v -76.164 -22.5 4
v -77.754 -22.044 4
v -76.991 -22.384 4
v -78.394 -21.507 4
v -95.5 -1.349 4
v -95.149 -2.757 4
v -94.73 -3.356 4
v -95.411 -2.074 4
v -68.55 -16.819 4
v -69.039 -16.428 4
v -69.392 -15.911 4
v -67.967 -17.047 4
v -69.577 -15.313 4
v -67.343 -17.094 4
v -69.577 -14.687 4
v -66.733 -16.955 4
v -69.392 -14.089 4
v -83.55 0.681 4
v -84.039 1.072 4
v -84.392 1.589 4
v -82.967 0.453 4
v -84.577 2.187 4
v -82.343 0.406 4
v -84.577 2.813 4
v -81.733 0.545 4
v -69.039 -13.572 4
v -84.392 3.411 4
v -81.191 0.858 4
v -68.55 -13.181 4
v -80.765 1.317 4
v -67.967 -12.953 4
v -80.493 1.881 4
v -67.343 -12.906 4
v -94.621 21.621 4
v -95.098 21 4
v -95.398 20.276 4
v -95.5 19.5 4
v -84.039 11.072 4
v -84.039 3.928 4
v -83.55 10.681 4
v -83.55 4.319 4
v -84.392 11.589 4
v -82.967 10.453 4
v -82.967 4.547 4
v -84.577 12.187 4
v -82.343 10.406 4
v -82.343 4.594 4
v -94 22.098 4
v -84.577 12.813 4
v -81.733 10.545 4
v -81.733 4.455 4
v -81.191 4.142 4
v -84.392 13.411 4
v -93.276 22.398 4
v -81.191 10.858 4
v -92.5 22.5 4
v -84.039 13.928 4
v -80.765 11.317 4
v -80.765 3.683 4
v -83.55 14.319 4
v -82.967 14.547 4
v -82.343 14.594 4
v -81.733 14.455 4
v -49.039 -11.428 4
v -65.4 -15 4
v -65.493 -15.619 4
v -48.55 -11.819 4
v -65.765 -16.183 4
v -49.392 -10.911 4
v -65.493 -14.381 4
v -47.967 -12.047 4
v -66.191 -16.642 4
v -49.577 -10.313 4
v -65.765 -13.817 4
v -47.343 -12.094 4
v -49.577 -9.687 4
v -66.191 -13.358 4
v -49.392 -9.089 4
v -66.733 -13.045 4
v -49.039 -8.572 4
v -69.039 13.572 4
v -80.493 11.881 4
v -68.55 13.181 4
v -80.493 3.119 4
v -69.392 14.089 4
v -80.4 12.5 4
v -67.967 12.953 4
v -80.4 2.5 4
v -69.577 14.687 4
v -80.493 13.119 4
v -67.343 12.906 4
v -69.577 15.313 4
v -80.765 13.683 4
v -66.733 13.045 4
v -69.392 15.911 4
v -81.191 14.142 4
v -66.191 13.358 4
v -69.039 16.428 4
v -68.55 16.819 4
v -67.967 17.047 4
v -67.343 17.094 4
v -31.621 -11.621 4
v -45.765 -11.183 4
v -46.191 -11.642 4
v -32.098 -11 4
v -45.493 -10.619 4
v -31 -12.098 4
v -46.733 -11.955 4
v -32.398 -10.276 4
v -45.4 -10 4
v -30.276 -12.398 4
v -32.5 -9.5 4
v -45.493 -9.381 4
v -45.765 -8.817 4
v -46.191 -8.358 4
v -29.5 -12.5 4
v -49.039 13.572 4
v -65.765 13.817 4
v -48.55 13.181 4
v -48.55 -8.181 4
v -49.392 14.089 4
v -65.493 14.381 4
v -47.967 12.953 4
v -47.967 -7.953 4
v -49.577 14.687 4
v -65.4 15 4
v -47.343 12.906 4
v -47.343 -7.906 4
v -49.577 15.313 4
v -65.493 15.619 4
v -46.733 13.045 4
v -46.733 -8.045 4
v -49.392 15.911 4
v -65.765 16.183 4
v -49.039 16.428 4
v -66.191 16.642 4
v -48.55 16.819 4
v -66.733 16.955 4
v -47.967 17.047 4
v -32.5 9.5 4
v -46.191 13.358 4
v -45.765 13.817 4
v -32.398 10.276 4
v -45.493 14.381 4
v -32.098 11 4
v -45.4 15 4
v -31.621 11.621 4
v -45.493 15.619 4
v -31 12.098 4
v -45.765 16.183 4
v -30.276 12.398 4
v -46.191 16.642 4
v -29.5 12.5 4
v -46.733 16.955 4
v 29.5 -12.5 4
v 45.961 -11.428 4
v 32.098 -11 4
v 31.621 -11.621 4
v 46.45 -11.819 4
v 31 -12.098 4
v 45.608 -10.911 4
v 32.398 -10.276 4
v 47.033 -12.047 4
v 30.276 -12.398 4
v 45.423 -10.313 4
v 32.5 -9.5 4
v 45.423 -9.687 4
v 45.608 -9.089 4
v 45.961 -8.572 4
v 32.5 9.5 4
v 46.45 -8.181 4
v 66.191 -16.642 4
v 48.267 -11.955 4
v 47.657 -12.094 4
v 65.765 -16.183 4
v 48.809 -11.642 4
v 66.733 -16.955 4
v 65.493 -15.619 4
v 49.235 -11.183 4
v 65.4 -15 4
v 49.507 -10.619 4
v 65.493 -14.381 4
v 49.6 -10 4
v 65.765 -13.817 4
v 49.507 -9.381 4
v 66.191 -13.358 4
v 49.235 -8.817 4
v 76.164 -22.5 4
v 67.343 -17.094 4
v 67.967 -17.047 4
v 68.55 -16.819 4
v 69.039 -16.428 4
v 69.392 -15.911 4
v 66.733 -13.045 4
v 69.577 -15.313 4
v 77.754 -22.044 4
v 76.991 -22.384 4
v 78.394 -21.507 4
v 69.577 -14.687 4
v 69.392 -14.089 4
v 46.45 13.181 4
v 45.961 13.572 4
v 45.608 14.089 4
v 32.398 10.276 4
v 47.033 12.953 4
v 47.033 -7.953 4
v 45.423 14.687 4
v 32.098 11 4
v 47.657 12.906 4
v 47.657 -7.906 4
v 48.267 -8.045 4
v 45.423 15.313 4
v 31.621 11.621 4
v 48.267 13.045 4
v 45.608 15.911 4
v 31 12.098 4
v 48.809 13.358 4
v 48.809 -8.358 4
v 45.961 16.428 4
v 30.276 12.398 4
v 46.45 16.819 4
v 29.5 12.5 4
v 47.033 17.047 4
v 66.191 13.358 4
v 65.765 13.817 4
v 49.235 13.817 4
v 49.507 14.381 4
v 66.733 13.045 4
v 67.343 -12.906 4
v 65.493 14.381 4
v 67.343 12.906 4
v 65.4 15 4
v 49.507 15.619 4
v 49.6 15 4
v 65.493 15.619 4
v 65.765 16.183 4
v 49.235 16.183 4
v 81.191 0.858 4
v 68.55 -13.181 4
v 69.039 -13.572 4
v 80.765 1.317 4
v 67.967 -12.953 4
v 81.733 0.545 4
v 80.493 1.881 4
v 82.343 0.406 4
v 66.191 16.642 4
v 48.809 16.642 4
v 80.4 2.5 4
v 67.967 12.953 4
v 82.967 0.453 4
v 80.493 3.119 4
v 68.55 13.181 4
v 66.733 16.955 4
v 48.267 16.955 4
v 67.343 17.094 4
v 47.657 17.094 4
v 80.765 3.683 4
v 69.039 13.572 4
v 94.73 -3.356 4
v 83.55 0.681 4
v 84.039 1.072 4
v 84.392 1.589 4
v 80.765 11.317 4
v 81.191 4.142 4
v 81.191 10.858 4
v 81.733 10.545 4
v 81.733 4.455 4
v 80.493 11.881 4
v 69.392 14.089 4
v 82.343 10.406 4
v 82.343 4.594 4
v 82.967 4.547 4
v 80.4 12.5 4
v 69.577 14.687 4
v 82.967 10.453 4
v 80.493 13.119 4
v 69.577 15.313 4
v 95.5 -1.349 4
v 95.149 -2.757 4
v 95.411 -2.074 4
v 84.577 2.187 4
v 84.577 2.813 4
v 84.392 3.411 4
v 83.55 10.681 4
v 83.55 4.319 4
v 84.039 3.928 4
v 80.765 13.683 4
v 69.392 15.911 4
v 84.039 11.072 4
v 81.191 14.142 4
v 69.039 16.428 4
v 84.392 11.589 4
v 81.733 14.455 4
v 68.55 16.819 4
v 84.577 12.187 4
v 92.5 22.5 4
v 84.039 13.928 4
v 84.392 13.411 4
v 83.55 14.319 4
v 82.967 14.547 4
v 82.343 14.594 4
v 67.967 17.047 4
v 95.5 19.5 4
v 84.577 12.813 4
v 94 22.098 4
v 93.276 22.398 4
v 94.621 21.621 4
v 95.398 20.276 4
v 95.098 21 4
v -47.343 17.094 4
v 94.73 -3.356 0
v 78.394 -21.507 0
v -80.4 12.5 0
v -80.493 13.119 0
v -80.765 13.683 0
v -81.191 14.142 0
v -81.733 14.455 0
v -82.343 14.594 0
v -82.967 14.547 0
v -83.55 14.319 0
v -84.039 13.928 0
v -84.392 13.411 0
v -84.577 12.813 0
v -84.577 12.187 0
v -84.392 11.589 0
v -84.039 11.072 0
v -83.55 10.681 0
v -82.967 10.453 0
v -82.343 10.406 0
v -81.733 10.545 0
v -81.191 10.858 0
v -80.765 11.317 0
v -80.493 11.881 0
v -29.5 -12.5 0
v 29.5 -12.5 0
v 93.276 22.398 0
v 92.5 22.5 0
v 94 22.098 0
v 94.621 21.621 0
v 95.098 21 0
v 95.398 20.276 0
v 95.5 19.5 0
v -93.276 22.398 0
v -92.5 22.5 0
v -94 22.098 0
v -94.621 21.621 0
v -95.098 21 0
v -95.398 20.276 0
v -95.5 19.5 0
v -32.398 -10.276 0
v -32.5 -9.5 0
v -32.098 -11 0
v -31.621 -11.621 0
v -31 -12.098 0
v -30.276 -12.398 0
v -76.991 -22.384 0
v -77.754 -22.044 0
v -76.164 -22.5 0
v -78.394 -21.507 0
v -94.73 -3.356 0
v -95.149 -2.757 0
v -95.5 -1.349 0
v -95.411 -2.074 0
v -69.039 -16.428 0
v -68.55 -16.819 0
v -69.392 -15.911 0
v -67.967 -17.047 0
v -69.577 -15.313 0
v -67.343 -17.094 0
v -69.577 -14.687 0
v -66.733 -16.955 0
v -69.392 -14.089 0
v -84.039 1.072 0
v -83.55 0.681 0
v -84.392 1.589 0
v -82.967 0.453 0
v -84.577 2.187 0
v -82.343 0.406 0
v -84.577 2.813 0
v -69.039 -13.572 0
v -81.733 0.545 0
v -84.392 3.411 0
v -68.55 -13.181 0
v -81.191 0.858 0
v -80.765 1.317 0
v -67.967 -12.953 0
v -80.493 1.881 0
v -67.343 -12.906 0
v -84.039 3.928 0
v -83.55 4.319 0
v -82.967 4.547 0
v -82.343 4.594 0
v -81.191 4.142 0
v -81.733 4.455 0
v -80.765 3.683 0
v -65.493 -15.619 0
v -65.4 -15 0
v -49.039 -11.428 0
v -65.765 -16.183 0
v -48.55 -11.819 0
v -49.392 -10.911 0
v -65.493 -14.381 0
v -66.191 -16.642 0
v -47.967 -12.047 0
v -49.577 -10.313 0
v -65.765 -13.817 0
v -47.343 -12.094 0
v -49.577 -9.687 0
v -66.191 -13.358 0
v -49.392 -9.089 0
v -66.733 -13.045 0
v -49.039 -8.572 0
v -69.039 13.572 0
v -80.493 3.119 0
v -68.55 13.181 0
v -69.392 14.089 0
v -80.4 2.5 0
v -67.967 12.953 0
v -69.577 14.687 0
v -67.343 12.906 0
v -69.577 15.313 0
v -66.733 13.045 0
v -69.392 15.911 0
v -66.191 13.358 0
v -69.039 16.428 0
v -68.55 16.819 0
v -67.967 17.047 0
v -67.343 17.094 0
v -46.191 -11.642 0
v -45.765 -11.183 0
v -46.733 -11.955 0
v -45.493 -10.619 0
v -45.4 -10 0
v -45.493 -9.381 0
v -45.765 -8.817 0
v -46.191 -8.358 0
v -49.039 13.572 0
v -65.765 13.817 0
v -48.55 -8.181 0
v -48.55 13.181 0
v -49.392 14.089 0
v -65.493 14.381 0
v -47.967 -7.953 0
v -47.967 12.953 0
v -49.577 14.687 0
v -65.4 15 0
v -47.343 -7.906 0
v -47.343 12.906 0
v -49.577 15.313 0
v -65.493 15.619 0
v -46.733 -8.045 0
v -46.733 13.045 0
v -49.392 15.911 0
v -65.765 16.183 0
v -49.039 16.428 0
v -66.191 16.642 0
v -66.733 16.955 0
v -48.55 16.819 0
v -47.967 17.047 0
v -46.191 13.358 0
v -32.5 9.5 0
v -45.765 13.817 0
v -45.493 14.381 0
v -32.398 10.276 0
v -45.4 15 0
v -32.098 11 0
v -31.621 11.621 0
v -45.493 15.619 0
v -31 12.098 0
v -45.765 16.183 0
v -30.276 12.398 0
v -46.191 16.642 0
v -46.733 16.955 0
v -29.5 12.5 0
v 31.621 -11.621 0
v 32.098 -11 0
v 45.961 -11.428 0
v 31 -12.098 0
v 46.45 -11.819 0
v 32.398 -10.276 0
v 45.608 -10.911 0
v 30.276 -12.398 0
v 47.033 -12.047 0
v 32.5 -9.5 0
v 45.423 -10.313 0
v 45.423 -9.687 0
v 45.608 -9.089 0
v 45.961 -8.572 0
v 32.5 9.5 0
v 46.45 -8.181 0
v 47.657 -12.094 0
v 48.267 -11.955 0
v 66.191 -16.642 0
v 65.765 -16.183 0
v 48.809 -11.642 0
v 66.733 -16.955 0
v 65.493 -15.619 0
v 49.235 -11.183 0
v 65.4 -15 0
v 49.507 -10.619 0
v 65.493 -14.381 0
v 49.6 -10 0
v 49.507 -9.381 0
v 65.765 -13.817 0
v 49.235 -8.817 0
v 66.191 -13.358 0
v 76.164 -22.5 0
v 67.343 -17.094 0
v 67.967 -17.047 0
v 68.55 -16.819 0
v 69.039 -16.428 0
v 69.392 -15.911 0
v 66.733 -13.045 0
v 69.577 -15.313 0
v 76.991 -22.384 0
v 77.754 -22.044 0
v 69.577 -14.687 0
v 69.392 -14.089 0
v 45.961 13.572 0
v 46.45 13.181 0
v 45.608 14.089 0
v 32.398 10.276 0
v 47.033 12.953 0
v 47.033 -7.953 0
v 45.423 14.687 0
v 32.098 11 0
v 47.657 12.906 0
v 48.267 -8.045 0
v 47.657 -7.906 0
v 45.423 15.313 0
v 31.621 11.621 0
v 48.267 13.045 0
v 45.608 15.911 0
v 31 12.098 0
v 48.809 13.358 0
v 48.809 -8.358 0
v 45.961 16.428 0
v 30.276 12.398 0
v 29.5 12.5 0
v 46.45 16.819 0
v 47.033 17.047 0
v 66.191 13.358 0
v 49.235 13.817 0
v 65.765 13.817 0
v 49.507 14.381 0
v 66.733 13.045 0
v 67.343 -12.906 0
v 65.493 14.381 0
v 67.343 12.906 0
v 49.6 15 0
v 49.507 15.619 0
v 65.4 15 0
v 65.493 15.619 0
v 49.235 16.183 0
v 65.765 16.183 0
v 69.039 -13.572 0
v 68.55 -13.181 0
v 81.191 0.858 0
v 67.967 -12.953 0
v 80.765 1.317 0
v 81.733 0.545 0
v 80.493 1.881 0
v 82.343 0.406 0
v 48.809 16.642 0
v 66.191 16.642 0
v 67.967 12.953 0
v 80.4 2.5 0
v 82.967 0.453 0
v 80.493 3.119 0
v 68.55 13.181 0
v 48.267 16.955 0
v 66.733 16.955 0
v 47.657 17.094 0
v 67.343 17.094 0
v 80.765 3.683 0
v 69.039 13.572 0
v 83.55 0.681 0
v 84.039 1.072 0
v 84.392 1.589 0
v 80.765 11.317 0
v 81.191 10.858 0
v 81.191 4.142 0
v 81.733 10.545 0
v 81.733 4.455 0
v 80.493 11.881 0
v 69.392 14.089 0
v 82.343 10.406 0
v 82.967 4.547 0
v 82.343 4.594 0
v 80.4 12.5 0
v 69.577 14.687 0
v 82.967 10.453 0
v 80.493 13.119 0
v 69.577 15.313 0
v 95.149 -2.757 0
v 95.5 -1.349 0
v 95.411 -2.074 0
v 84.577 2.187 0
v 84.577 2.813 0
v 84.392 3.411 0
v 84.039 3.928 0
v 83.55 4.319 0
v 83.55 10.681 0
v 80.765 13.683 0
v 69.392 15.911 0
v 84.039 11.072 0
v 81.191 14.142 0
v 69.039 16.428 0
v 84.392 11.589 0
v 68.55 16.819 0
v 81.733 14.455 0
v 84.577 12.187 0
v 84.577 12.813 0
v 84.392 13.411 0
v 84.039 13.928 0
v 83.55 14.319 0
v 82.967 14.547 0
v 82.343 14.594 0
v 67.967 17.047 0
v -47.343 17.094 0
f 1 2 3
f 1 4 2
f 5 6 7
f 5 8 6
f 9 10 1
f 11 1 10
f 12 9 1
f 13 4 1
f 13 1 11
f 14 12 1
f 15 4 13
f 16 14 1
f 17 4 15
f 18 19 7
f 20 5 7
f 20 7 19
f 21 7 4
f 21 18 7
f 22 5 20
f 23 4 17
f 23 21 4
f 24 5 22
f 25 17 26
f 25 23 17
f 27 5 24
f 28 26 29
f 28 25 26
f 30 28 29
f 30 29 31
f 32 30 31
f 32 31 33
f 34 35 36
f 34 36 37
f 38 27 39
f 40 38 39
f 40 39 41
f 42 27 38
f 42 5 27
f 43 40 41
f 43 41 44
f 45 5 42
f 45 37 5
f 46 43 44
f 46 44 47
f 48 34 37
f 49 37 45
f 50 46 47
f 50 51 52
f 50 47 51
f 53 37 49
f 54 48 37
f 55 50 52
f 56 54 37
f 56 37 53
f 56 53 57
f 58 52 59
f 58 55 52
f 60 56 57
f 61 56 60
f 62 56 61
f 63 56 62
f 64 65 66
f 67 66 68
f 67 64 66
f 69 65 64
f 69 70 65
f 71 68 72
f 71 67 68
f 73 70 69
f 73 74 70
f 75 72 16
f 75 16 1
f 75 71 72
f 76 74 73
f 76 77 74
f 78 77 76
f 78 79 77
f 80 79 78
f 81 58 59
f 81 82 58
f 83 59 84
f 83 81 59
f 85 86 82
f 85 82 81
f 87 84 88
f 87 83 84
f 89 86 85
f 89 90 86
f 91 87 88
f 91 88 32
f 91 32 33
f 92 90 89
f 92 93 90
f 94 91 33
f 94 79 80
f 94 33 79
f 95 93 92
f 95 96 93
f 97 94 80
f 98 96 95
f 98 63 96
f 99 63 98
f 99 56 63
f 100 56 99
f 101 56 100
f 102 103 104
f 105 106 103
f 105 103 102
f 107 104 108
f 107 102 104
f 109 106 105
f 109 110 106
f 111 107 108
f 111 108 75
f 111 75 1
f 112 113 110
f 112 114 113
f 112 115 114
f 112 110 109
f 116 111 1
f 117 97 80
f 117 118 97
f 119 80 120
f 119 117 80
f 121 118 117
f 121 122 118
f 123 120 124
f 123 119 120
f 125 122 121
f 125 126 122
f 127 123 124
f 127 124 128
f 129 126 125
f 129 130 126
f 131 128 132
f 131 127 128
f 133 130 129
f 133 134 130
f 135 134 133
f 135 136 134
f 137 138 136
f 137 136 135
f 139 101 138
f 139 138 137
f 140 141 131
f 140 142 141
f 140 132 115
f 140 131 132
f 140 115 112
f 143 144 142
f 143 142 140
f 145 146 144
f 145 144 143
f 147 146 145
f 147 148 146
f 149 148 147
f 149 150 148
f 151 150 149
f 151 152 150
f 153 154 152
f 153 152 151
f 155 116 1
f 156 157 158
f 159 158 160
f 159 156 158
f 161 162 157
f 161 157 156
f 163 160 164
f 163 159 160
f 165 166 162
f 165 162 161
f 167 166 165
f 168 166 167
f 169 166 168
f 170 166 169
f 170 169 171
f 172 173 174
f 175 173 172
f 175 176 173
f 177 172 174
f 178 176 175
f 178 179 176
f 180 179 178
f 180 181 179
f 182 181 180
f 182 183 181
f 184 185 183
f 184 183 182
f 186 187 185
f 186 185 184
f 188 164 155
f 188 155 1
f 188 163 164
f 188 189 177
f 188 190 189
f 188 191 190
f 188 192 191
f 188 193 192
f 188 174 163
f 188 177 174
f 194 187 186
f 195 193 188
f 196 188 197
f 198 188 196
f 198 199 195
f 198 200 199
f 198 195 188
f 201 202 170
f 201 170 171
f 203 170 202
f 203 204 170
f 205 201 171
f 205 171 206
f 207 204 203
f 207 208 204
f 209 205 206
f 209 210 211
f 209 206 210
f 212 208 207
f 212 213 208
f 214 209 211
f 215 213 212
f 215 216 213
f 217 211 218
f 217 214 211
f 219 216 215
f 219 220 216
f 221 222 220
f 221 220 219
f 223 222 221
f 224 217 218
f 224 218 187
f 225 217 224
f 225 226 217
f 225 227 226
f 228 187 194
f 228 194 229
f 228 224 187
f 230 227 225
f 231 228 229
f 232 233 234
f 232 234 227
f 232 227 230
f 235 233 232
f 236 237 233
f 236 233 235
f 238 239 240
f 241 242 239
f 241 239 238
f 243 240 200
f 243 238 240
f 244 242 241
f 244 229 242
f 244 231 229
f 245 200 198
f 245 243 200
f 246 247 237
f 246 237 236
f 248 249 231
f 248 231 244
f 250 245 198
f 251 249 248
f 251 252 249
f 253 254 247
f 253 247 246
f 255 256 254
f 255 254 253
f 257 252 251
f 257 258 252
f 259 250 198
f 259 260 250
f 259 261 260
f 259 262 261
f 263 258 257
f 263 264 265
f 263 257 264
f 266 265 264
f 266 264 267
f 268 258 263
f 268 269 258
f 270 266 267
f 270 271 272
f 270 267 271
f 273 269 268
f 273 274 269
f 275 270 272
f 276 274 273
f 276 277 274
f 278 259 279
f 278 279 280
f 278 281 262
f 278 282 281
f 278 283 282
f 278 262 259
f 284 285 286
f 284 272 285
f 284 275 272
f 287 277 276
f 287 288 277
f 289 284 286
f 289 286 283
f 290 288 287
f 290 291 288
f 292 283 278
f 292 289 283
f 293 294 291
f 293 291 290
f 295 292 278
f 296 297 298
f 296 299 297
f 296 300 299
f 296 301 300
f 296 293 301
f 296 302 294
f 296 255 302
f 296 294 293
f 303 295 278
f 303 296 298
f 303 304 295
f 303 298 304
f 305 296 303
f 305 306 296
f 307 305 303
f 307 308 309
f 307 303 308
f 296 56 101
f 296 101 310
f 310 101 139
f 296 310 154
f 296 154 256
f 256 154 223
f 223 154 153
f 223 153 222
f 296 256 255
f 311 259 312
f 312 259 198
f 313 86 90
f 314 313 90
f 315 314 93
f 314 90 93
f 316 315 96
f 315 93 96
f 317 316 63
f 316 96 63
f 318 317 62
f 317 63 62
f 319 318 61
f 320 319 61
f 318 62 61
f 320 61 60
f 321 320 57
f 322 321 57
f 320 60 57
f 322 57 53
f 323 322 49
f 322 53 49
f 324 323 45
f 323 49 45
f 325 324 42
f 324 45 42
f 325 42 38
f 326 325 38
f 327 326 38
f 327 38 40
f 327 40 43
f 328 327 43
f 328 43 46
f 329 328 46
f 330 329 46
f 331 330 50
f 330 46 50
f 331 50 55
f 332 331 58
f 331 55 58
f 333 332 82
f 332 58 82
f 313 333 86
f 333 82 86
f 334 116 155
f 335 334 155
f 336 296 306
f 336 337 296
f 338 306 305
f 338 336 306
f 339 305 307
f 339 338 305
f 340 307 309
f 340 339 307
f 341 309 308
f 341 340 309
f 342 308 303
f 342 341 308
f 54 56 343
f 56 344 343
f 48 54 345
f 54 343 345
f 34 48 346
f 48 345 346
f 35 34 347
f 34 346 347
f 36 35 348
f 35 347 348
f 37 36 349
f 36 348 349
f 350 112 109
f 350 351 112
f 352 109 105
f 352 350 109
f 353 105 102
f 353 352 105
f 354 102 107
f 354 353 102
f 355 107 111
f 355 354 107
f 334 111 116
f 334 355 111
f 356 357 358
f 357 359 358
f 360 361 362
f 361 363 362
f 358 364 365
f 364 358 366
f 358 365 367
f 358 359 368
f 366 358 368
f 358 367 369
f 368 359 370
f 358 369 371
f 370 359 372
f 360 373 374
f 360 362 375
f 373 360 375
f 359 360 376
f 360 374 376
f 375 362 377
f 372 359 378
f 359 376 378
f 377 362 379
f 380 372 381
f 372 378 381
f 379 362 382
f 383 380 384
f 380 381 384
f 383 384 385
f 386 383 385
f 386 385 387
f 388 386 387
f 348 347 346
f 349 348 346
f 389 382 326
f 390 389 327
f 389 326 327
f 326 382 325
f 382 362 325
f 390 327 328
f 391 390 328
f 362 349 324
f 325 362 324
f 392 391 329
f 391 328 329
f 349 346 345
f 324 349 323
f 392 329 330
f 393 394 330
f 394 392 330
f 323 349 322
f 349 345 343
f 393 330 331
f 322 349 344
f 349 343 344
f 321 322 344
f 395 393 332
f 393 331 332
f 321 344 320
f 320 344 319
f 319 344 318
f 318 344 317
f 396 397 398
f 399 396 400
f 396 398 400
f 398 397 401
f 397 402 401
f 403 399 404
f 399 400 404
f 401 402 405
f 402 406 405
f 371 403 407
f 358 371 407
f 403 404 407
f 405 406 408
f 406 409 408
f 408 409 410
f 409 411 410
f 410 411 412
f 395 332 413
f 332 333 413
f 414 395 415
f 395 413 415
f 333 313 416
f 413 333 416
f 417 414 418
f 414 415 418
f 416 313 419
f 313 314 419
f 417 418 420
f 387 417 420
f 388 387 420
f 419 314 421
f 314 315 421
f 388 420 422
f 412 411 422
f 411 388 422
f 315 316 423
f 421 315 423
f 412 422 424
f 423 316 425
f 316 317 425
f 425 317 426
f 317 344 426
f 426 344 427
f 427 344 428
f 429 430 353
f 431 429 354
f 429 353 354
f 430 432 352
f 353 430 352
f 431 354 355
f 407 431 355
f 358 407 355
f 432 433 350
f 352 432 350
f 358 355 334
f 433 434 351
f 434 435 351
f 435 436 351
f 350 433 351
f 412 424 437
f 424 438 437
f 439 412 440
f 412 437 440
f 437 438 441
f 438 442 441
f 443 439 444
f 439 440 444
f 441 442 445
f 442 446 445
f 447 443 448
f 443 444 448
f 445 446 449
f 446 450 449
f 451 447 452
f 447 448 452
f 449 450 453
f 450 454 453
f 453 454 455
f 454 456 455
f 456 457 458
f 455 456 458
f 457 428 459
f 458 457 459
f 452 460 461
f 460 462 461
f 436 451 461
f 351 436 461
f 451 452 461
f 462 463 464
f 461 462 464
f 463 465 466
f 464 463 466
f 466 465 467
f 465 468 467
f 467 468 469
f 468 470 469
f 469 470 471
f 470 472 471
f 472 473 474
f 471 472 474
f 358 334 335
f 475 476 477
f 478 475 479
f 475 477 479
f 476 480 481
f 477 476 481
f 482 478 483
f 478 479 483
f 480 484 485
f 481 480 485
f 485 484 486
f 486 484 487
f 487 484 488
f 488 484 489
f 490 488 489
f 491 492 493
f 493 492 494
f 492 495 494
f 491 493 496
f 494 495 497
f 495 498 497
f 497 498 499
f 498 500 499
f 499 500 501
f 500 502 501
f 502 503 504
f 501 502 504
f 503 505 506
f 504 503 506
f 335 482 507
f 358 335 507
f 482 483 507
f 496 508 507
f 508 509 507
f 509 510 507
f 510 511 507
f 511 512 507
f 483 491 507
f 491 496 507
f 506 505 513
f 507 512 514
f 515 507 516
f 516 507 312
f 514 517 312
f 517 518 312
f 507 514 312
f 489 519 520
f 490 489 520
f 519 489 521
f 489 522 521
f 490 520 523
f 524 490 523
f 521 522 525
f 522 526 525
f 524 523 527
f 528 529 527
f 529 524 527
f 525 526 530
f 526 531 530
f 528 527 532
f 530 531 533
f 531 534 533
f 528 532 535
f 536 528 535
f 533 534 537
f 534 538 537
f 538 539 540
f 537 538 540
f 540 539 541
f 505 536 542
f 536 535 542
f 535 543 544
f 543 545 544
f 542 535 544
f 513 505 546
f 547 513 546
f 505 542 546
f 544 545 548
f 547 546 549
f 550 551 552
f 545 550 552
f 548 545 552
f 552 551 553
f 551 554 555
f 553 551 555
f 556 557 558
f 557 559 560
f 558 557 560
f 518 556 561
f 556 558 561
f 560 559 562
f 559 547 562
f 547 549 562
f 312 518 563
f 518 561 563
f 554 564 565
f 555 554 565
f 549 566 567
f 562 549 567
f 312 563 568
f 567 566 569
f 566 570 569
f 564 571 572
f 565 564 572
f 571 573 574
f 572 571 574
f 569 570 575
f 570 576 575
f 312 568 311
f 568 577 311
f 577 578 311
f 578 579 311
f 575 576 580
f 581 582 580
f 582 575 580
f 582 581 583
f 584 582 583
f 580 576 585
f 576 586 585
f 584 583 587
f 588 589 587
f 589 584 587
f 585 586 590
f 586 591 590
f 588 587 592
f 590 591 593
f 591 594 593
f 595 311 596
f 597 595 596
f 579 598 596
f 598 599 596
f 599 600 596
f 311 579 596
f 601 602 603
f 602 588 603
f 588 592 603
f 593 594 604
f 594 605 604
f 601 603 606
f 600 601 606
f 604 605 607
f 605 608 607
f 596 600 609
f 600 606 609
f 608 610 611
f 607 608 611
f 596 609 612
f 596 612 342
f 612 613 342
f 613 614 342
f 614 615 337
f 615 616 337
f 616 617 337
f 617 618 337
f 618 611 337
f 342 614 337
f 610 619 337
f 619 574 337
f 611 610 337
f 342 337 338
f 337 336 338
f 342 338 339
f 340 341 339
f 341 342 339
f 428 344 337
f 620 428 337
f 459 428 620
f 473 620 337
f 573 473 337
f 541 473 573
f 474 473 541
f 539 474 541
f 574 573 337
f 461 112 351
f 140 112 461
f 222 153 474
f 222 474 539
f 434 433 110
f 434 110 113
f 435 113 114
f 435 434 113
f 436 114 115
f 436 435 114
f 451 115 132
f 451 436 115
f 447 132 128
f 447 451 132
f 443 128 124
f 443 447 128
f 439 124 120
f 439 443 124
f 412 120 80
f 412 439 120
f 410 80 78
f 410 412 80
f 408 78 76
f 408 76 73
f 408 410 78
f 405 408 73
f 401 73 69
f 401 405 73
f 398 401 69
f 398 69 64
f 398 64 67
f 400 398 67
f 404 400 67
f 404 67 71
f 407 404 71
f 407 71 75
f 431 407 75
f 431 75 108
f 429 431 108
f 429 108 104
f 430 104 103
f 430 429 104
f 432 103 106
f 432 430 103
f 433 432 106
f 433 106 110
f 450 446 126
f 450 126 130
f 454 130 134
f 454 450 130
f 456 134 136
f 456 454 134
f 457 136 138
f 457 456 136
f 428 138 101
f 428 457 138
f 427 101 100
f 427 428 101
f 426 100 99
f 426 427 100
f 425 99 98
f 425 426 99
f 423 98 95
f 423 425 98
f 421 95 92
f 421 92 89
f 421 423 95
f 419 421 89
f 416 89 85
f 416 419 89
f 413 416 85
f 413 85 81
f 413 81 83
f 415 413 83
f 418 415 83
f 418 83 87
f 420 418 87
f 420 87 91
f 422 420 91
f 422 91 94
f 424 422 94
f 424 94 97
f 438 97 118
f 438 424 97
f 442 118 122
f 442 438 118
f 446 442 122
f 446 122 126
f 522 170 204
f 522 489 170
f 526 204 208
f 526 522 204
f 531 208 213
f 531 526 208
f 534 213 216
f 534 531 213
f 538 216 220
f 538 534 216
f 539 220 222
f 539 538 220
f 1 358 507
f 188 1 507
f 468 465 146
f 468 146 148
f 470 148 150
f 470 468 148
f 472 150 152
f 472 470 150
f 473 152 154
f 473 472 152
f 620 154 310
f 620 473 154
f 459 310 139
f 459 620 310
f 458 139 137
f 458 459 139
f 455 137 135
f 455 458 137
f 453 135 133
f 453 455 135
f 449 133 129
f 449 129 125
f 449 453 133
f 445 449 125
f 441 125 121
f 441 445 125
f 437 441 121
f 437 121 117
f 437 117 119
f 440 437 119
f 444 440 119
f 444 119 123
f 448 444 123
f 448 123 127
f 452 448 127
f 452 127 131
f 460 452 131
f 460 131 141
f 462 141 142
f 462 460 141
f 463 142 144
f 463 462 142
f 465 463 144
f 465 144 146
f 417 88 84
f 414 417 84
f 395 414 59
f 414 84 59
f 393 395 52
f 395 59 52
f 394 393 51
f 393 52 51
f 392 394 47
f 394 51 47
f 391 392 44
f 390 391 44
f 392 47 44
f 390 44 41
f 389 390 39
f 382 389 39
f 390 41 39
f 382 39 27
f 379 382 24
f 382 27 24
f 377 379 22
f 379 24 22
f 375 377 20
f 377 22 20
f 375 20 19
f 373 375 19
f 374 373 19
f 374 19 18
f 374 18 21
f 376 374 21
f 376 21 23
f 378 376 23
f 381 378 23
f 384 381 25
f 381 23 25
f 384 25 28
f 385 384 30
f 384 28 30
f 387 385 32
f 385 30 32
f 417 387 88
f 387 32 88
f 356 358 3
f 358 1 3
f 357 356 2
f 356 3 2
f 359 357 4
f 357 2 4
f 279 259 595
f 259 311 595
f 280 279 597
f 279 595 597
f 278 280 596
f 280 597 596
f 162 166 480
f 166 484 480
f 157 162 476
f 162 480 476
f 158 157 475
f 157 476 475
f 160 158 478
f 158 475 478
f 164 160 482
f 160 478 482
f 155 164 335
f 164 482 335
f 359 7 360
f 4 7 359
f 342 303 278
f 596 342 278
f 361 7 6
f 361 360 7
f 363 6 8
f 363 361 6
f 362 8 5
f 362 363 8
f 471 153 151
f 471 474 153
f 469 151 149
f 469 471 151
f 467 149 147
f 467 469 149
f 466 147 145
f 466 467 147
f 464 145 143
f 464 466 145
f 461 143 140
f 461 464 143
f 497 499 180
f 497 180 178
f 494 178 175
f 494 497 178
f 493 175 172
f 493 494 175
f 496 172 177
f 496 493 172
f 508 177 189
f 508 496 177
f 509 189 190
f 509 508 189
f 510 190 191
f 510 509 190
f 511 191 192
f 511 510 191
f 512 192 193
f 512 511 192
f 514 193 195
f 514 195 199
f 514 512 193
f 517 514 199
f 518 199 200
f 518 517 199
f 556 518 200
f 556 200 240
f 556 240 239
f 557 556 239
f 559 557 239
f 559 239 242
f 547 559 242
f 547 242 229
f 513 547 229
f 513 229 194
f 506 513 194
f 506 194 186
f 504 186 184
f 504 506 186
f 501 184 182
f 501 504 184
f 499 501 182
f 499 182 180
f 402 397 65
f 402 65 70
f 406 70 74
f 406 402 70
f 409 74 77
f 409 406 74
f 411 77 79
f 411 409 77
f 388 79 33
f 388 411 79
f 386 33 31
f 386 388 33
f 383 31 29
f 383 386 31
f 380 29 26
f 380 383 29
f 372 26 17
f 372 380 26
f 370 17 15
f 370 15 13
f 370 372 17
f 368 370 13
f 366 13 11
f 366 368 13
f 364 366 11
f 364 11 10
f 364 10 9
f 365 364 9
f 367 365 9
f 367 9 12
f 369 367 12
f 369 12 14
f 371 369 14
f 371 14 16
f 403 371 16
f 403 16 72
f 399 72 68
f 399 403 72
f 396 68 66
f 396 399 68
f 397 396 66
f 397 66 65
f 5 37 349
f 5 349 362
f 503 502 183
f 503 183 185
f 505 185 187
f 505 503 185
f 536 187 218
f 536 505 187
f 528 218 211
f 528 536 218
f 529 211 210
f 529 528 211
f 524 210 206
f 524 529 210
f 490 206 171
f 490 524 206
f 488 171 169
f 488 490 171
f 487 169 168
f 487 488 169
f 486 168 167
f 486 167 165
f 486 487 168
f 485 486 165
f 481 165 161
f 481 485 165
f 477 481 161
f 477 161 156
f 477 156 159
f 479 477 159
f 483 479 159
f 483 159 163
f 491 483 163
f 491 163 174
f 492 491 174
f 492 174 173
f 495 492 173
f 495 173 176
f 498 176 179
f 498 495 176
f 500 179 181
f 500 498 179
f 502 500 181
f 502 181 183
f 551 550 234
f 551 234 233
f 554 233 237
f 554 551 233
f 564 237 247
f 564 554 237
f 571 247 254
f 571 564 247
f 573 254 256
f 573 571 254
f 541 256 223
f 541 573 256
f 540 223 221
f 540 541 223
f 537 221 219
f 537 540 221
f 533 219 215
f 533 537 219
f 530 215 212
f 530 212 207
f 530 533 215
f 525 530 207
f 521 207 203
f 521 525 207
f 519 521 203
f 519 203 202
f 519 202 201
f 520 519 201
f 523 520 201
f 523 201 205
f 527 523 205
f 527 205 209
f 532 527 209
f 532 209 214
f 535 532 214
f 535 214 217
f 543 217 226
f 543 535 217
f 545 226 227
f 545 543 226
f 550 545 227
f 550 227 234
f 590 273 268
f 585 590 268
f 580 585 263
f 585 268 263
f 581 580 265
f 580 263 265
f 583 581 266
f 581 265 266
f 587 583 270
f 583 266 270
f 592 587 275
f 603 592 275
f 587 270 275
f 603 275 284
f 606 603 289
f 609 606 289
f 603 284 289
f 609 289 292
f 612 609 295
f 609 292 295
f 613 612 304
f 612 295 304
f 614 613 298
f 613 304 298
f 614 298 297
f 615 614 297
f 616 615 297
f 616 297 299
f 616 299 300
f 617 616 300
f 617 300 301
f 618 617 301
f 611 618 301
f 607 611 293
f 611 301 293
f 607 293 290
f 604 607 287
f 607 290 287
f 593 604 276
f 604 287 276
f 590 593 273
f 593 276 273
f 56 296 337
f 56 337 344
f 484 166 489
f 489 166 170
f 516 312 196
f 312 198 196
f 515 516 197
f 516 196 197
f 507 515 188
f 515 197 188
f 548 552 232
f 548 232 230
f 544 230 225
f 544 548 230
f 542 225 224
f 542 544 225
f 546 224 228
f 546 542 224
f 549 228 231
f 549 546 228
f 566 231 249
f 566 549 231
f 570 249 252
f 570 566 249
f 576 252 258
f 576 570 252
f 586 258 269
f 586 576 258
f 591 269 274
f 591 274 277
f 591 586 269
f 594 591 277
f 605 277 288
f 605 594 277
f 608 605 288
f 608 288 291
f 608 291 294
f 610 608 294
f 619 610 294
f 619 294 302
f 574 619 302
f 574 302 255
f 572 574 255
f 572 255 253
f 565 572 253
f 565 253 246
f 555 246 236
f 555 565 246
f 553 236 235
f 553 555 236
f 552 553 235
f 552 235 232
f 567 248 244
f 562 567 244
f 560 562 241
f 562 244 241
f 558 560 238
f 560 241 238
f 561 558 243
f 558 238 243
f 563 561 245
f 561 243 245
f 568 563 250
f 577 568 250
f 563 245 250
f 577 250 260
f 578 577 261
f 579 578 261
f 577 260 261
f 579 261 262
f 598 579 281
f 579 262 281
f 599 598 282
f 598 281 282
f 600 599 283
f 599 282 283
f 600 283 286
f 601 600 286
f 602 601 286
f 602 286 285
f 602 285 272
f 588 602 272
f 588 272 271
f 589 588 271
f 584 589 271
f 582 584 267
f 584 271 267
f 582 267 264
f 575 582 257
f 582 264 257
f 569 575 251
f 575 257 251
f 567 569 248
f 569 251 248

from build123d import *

# Parameters (mm, degrees)
SKETCH_1_W          = 155
SKETCH_1_H          = 45
SKETCH_1_R          = 2.1
EXTRUDE_1_DEPTH     = 4
SKETCH_2_W          = 65
SKETCH_2_H          = 25
CUT_EXTRUDE_1_DEPTH = 10
SKETCH_3_R          = 2.1
EXTRUDE_2_DEPTH     = 4
FILLET_1_R          = 3


with BuildPart() as part:
    # 草图1 → 凸台-拉伸1 (new body)
    with BuildSketch(Plane.XY):
        Rectangle(SKETCH_1_W, SKETCH_1_H)
        with Locations((-67.5, 15)):
            Circle(SKETCH_1_R, mode=Mode.SUBTRACT)
        with Locations((-67.5, -15)):
            Circle(SKETCH_1_R, mode=Mode.SUBTRACT)
        with Locations(Location((67.5, 15, 0), (0, 0, 180))):
            Circle(SKETCH_1_R, mode=Mode.SUBTRACT)
        with Locations(Location((67.5, -15, 0), (0, 0, 180))):
            Circle(SKETCH_1_R, mode=Mode.SUBTRACT)
        with Locations((-47.5, 15)):
            Circle(SKETCH_1_R, mode=Mode.SUBTRACT)
        with Locations((47.5, 15)):
            Circle(SKETCH_1_R, mode=Mode.SUBTRACT)
        with Locations((-47.5, -10)):
            Circle(SKETCH_1_R, mode=Mode.SUBTRACT)
        with Locations((47.5, -10)):
            Circle(SKETCH_1_R, mode=Mode.SUBTRACT)
    extrude(amount=EXTRUDE_1_DEPTH)

    # 草图2 → 切除-拉伸1 (cut)
    with BuildSketch(Plane.XY.offset(4)):
        Rectangle(SKETCH_2_W, SKETCH_2_H)
    extrude(amount=-CUT_EXTRUDE_1_DEPTH, mode=Mode.SUBTRACT)

    # 草图3 → 凸台-拉伸2 (add)
    # profile 1 of 2: a face of its own
    with BuildSketch(Plane.XY.offset(4)):
        Polygon((-77.5, 22.5), (-95.5, 22.5), (-95.5, -2.5), (-77.5, -22.5), align=None)
        with Locations((-82.5, 12.5)):
            Circle(SKETCH_3_R, mode=Mode.SUBTRACT)
        with Locations((-82.5, 2.5)):
            Circle(SKETCH_3_R, mode=Mode.SUBTRACT)
    # profile 2 of 2: a face of its own
    with BuildSketch(Plane.XY.offset(4)):
        Polygon((77.5, 22.5), (95.5, 22.5), (95.5, -2.5), (77.5, -22.5), align=None)
        with Locations(Location((82.5, 12.5, 0), (0, 0, 180))):
            Circle(SKETCH_3_R, mode=Mode.SUBTRACT)
        with Locations(Location((82.5, 2.5, 0), (0, 0, 180))):
            Circle(SKETCH_3_R, mode=Mode.SUBTRACT)
    extrude(amount=-EXTRUDE_2_DEPTH)

    # 圆角1
    fillet_1_edges = [part.edges().sort_by_distance(p)[0] for p in [
        (32.5, 12.5, 2),
        (32.5, -12.5, 2),
        (-32.5, -12.5, 2),
        (-32.5, 12.5, 2),
        (-95.5, -2.5, 2),
        (-95.5, 22.5, 2),
        (77.5, -22.5, 2),
        (-77.5, -22.5, 2),
        (95.5, 22.5, 2),
        (95.5, -2.5, 2),
    ]]
    fillet(fillet_1_edges, radius=FILLET_1_R)


solid = part.part
